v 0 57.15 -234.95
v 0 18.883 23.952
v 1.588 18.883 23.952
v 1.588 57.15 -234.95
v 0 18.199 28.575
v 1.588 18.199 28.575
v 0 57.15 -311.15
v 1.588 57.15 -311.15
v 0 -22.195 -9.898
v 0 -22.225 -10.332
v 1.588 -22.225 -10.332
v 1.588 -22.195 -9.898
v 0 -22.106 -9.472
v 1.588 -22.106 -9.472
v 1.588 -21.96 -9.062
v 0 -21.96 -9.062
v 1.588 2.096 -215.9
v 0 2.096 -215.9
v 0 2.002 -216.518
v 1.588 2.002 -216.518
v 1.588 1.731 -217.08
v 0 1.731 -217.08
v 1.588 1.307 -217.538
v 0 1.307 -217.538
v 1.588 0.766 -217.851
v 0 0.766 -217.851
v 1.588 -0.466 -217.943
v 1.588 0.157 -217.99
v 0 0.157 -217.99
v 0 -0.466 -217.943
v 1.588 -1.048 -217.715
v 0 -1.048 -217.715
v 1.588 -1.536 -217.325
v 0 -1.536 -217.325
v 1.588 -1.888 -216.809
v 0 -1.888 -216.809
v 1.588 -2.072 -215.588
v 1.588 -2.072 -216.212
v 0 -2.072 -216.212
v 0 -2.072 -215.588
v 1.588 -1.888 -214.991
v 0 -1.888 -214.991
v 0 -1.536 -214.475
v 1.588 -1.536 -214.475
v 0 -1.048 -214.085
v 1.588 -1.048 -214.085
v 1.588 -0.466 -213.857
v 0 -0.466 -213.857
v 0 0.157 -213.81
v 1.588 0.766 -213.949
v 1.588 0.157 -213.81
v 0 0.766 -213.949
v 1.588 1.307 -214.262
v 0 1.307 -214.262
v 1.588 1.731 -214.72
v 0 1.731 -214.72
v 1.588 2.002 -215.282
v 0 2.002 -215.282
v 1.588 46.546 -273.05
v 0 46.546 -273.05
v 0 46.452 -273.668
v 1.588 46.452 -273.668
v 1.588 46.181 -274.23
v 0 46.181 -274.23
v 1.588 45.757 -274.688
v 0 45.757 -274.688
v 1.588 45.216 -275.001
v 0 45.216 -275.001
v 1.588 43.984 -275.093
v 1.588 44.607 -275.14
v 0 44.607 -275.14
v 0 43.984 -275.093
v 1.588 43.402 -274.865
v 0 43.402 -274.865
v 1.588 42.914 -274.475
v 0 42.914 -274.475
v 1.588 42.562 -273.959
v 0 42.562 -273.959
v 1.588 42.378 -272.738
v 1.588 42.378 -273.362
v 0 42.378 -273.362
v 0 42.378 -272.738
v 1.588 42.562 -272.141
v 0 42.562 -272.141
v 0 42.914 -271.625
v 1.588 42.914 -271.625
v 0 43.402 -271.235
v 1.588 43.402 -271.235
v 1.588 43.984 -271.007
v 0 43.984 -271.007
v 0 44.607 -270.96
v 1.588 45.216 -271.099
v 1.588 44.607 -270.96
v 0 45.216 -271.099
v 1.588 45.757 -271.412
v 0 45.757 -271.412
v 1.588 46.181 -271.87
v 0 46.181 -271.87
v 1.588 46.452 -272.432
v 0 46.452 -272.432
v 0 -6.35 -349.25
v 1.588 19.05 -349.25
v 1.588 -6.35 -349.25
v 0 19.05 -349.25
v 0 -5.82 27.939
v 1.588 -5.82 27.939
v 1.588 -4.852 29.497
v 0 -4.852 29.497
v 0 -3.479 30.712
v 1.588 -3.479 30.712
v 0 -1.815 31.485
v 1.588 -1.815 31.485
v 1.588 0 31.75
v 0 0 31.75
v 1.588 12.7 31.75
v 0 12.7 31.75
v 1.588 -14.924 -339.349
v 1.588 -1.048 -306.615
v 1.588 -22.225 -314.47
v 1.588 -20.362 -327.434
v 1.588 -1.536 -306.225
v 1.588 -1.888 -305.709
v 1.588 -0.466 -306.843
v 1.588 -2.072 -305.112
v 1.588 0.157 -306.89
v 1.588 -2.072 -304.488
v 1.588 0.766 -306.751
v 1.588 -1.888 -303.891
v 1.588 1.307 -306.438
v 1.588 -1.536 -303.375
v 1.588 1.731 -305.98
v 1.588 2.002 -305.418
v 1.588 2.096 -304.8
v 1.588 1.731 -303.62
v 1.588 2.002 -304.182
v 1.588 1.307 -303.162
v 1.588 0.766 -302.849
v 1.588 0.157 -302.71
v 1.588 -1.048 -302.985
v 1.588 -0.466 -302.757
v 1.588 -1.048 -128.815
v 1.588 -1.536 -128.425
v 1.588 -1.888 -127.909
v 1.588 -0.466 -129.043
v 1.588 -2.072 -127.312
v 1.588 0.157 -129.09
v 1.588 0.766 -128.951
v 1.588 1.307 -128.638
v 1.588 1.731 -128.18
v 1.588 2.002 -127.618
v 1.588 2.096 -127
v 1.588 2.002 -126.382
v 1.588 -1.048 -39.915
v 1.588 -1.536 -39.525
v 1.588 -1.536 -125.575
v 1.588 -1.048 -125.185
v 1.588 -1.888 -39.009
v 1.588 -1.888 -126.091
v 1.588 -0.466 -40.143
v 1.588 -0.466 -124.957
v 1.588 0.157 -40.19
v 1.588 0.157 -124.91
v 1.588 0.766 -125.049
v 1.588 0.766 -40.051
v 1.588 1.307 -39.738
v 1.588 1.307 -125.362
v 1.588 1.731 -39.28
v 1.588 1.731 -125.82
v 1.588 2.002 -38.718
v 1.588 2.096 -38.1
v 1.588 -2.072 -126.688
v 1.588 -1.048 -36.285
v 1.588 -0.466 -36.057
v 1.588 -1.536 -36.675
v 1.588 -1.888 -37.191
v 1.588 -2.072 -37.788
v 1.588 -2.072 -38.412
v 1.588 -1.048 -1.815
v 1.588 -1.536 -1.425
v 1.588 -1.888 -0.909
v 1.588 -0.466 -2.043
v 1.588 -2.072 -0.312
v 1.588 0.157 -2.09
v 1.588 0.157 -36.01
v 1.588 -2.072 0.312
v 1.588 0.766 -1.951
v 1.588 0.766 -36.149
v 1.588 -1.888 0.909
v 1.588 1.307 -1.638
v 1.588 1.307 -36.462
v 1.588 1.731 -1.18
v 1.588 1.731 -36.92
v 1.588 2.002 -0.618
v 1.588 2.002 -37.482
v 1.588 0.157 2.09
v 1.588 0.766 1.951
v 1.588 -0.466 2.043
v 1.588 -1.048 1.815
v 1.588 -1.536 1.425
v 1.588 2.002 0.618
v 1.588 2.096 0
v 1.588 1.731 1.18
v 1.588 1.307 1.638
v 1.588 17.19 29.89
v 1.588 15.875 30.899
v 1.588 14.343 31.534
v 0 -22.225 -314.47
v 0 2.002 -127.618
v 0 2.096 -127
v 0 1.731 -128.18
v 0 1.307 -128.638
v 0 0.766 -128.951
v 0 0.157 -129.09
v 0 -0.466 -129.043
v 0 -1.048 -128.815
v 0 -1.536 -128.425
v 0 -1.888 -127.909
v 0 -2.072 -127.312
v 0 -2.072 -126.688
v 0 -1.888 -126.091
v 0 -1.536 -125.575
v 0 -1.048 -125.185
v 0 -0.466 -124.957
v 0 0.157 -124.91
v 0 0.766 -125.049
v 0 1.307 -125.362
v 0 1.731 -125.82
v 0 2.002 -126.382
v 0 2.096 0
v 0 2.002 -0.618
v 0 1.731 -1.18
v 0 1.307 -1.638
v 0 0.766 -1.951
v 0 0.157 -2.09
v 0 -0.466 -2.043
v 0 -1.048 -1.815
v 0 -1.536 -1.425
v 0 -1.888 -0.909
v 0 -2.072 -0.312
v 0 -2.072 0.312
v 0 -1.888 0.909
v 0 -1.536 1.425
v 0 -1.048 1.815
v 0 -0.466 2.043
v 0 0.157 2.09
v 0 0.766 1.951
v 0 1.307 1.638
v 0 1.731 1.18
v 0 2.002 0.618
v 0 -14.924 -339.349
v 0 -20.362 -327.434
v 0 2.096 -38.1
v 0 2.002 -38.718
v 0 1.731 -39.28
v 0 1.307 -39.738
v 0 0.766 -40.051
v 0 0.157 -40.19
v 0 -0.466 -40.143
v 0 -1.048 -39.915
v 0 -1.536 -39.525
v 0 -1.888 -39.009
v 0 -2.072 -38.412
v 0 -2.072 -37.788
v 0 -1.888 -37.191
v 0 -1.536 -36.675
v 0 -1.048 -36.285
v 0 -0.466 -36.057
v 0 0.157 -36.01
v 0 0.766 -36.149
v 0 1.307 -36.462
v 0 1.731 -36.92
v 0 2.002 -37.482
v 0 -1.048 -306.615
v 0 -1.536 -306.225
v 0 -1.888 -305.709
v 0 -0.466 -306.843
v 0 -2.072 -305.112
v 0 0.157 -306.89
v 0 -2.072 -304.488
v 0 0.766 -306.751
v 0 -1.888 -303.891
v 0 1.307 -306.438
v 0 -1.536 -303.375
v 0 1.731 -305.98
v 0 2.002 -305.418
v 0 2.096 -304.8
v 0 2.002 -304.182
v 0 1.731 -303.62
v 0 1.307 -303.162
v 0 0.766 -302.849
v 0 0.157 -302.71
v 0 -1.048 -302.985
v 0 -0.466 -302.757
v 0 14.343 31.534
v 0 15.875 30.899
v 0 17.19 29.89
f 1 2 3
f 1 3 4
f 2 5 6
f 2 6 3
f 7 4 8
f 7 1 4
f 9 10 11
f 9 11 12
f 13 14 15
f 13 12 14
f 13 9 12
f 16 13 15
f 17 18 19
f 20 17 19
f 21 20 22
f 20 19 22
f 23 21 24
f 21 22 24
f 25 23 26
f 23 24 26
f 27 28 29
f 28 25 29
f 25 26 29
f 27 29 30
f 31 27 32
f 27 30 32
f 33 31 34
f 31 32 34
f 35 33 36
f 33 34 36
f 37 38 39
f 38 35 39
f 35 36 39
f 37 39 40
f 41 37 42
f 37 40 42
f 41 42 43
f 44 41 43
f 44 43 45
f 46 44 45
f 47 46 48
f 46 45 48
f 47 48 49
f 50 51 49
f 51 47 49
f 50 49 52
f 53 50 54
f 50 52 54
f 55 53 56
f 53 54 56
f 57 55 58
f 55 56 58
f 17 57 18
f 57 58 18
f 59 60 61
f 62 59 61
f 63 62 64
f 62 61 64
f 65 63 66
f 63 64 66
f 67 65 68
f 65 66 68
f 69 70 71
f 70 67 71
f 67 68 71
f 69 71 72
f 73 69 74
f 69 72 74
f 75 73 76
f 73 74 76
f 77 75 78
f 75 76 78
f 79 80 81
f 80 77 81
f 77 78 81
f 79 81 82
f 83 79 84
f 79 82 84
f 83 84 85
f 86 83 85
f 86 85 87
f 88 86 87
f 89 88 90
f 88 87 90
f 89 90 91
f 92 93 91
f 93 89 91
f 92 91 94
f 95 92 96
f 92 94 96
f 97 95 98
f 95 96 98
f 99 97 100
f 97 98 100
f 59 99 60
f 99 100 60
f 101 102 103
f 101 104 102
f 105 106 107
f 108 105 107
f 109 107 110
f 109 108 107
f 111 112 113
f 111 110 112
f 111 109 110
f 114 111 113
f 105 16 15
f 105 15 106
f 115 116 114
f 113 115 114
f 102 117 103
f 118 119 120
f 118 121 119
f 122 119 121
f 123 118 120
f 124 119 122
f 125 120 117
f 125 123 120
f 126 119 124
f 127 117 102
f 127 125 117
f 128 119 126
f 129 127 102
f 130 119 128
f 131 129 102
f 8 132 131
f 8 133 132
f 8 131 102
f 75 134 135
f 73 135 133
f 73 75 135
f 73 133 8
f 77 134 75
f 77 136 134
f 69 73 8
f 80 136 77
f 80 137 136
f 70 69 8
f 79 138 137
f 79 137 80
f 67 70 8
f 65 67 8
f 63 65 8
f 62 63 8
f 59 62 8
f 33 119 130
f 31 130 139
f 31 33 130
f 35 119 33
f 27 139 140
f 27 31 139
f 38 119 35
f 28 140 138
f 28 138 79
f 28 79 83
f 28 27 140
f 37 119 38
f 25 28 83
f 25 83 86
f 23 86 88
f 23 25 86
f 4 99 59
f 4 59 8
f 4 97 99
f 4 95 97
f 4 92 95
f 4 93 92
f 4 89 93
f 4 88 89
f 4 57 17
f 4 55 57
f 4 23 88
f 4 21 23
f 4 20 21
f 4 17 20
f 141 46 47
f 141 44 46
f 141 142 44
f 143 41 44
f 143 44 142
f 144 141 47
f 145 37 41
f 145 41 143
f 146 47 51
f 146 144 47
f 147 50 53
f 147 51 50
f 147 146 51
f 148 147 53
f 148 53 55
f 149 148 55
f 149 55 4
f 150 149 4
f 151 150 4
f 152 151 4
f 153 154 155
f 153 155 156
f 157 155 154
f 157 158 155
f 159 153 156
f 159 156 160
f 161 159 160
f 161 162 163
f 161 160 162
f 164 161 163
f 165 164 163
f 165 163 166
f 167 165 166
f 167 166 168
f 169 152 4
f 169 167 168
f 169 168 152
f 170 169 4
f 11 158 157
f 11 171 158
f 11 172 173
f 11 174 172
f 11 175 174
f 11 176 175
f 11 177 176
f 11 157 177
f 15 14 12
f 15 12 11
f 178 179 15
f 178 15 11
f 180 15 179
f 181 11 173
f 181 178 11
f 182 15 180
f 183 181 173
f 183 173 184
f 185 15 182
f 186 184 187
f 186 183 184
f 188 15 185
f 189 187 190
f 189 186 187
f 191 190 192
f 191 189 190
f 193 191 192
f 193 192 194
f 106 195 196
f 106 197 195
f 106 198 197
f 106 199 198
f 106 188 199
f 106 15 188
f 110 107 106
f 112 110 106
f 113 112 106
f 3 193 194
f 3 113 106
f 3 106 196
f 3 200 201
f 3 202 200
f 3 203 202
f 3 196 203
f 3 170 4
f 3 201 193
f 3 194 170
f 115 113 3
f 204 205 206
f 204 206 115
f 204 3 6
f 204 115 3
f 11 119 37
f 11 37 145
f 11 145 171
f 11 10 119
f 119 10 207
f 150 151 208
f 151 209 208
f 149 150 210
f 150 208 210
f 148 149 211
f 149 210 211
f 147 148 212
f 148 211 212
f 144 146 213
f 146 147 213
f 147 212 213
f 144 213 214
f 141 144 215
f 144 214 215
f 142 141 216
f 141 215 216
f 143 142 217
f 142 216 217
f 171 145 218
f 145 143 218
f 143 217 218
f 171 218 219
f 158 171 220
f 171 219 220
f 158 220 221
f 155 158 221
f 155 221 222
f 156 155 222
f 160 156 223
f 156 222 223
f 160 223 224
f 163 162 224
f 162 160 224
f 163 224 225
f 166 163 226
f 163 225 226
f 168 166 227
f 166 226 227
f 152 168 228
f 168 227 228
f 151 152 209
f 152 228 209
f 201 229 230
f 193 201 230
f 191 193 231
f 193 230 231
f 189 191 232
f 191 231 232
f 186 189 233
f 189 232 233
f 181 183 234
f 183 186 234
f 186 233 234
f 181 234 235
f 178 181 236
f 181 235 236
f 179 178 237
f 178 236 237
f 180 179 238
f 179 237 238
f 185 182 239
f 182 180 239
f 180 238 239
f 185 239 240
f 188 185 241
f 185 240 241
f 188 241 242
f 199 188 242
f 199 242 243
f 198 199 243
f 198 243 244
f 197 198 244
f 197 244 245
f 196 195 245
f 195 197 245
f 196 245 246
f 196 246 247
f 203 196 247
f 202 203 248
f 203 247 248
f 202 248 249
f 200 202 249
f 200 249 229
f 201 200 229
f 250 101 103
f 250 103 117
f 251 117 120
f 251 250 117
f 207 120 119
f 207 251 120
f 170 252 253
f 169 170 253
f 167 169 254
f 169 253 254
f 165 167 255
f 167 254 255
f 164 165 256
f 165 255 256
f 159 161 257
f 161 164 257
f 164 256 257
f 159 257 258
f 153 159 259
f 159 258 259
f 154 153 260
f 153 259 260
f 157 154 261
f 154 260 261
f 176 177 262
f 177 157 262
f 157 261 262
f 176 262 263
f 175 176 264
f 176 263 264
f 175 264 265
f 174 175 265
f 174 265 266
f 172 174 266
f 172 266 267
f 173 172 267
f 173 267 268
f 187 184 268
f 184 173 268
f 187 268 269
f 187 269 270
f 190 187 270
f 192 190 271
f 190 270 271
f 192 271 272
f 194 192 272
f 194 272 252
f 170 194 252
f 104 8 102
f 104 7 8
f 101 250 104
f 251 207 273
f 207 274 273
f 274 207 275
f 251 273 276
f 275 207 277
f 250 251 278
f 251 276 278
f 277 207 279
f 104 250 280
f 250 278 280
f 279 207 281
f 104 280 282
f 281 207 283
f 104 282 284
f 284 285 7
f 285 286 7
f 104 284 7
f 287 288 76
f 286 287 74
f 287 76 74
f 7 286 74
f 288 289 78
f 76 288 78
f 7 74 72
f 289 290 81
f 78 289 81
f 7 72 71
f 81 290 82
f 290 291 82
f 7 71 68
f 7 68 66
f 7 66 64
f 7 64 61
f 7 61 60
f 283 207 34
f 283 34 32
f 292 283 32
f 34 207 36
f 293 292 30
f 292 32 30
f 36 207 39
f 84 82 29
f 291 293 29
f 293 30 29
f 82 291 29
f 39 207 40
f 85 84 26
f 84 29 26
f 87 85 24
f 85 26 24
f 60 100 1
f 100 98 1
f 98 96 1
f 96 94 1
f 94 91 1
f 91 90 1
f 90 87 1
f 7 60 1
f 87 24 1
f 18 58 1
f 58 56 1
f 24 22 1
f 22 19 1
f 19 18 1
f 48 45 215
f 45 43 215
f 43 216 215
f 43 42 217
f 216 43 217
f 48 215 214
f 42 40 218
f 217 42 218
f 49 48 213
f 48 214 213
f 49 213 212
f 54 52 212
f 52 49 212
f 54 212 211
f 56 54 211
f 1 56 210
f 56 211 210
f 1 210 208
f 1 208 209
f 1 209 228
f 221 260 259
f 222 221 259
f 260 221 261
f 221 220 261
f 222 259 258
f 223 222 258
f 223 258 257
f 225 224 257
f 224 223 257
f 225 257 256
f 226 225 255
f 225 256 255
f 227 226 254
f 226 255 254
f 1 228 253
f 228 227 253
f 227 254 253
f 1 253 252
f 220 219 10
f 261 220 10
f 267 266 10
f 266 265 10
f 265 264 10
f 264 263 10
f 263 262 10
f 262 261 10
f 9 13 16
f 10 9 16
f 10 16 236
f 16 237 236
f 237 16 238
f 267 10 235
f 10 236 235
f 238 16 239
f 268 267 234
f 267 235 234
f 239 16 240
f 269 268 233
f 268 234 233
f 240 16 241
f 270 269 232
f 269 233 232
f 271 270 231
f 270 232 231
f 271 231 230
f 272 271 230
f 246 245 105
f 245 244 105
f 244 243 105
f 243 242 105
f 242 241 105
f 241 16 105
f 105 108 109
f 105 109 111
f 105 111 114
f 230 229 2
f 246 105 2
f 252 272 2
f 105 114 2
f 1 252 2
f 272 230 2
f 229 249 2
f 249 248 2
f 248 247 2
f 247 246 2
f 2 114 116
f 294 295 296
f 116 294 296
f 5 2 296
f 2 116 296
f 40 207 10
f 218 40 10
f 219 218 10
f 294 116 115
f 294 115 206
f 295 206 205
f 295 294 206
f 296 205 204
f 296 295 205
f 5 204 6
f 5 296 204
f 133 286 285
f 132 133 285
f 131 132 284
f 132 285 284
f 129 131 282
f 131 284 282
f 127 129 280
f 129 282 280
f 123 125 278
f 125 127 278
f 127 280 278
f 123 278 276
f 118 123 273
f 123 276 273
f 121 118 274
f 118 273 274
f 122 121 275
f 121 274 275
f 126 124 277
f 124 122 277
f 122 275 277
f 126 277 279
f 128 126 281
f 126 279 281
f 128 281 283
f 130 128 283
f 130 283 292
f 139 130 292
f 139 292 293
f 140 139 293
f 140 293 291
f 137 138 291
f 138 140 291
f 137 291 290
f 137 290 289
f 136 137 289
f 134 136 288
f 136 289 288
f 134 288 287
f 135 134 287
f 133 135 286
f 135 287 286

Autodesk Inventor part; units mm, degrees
ref_plane "YZ Plane" through (0, 0, 0) normal (1, 0, 0) x (0, 1, 0)
ref_plane "XZ Plane" through (0, 0, 0) normal (0, 1, 0) x (-1, 0, 0)
ref_plane "XY Plane" through (0, 0, 0) normal (0, 0, 1) x (1, 0, 0)
sketch "main" plane through (0, 0, 0) normal (0, 0, 1) x (1, 0, 0)
  circle A0 centre (-12.3674, 169.8166) radius 2.0955
  circle A1 centre (-12.3674, 131.7166) radius 2.0955
  circle A2 centre (-12.3674, 42.8166) radius 2.0955
  circle A3 centre (-12.3674, -46.0834) radius 2.0955
  circle A4 centre (-12.3674, -134.9834) radius 2.0955
  arc A5 (6.5152, 193.7683) -> (0.3326, 201.5666) centre (0.3326, 195.2166) ccw
  line L0 (-34.5924, 159.4847) -> (-34.5924, -144.653)
  line L1 (5.8319, 198.3916) -> (44.7826, -65.1334)
  arc A6 (-34.3276, 160.7541) -> (-34.5924, 159.4847) centre (-31.4174, 159.4847) ccw
  line L2 (-34.3276, 160.7541) -> (-18.1878, 197.7554)
  line L3 (0.3326, 201.5666) -> (-12.3674, 201.5666)
  arc A7 (-12.3674, 201.5666) -> (-18.1878, 197.7554) centre (-12.3674, 195.2166) ccw
  line L4 (44.7826, -65.1334) -> (44.7826, -141.3334)
  arc A8 (-34.5924, -144.653) -> (-18.7174, -179.4334) centre (11.4451, -144.653) ccw
  line L5 (6.6826, -179.4334) -> (-18.7174, -179.4334)
  line L6 (44.7826, -141.3334) -> (6.6826, -179.4334)
  circle A9 centre (32.0826, -103.2334) radius 2.0955
  point P0 (-1.329, 35.5886)
  point P1 (-34.5924, 160.147)
  point P2 (38.4326, -84.1834)
  dimension "d0" = 12.7
  dimension "d1" = 304.8
  dimension "d2" = 15.875
  dimension "d3" = 25.4
  dimension "d4" = 3.175
  dimension "d8" = 4.191
  dimension "d9" = 4.191
  dimension "d10" = 4.191
  dimension "d11" = 4.191
  dimension "d12" = 4.191
  dimension "d13" = 4.191
sketch "Sketch1" plane through (0, 0, 0) normal (1, 0, 0) x (0, 1, 0)
  circle A0 centre (0, 0) radius 2.0955
  circle A1 centre (0, -38.1) radius 2.0955
  circle A2 centre (0, -127) radius 2.0955
  circle A3 centre (0, -215.9) radius 2.0955
  circle A4 centre (0, -304.8) radius 2.0955
  arc A5 (18.8826, 23.9517) -> (12.7, 31.75) centre (12.7, 25.4) ccw
  line L0 (-22.225, -10.3319) -> (-22.225, -314.4696)
  line L1 (18.1993, 28.575) -> (57.15, -234.95)
  arc A6 (-21.9602, -9.0625) -> (-22.225, -10.3319) centre (-19.05, -10.3319) ccw
  line L2 (-21.9602, -9.0625) -> (-5.8204, 27.9388)
  line L3 (12.7, 31.75) -> (0, 31.75)
  arc A7 (0, 31.75) -> (-5.8204, 27.9388) centre (0, 25.4) ccw
  line L4 (57.15, -234.95) -> (57.15, -311.15)
  arc A8 (-22.225, -314.4696) -> (-6.35, -349.25) centre (23.8125, -314.4696) ccw
  line L5 (19.05, -349.25) -> (-6.35, -349.25)
  line L6 (57.15, -311.15) -> (19.05, -349.25)
  circle A9 centre (44.45, -273.05) radius 2.0955
extrude "Extrusion1" add sketch "Sketch1" along normal blind 1.5875 contours L1 L4 L6 L5 A8 L0 A6 L2 A7 L3 A5
equation "\"BendRadius\" = Thickness"
equation "\"BendReliefWidth\" = Thickness"
equation "\"BendReliefDepth\" = 0.5 * Thickness"
equation "\"CornerReliefSize\" = 4 * Thickness"
equation "\"MinimumRemnant\" = 2 * Thickness"
equation "\"TransitionRadius\" = BendRadius"
equation "\"JacobiRadiusSize\" = BendRadius"
equation "\"GapSize\" = Thickness"
equation "\"Thickness\" = 1.5875"
properties part number "Skirt" material "Acetal Resin, White"
